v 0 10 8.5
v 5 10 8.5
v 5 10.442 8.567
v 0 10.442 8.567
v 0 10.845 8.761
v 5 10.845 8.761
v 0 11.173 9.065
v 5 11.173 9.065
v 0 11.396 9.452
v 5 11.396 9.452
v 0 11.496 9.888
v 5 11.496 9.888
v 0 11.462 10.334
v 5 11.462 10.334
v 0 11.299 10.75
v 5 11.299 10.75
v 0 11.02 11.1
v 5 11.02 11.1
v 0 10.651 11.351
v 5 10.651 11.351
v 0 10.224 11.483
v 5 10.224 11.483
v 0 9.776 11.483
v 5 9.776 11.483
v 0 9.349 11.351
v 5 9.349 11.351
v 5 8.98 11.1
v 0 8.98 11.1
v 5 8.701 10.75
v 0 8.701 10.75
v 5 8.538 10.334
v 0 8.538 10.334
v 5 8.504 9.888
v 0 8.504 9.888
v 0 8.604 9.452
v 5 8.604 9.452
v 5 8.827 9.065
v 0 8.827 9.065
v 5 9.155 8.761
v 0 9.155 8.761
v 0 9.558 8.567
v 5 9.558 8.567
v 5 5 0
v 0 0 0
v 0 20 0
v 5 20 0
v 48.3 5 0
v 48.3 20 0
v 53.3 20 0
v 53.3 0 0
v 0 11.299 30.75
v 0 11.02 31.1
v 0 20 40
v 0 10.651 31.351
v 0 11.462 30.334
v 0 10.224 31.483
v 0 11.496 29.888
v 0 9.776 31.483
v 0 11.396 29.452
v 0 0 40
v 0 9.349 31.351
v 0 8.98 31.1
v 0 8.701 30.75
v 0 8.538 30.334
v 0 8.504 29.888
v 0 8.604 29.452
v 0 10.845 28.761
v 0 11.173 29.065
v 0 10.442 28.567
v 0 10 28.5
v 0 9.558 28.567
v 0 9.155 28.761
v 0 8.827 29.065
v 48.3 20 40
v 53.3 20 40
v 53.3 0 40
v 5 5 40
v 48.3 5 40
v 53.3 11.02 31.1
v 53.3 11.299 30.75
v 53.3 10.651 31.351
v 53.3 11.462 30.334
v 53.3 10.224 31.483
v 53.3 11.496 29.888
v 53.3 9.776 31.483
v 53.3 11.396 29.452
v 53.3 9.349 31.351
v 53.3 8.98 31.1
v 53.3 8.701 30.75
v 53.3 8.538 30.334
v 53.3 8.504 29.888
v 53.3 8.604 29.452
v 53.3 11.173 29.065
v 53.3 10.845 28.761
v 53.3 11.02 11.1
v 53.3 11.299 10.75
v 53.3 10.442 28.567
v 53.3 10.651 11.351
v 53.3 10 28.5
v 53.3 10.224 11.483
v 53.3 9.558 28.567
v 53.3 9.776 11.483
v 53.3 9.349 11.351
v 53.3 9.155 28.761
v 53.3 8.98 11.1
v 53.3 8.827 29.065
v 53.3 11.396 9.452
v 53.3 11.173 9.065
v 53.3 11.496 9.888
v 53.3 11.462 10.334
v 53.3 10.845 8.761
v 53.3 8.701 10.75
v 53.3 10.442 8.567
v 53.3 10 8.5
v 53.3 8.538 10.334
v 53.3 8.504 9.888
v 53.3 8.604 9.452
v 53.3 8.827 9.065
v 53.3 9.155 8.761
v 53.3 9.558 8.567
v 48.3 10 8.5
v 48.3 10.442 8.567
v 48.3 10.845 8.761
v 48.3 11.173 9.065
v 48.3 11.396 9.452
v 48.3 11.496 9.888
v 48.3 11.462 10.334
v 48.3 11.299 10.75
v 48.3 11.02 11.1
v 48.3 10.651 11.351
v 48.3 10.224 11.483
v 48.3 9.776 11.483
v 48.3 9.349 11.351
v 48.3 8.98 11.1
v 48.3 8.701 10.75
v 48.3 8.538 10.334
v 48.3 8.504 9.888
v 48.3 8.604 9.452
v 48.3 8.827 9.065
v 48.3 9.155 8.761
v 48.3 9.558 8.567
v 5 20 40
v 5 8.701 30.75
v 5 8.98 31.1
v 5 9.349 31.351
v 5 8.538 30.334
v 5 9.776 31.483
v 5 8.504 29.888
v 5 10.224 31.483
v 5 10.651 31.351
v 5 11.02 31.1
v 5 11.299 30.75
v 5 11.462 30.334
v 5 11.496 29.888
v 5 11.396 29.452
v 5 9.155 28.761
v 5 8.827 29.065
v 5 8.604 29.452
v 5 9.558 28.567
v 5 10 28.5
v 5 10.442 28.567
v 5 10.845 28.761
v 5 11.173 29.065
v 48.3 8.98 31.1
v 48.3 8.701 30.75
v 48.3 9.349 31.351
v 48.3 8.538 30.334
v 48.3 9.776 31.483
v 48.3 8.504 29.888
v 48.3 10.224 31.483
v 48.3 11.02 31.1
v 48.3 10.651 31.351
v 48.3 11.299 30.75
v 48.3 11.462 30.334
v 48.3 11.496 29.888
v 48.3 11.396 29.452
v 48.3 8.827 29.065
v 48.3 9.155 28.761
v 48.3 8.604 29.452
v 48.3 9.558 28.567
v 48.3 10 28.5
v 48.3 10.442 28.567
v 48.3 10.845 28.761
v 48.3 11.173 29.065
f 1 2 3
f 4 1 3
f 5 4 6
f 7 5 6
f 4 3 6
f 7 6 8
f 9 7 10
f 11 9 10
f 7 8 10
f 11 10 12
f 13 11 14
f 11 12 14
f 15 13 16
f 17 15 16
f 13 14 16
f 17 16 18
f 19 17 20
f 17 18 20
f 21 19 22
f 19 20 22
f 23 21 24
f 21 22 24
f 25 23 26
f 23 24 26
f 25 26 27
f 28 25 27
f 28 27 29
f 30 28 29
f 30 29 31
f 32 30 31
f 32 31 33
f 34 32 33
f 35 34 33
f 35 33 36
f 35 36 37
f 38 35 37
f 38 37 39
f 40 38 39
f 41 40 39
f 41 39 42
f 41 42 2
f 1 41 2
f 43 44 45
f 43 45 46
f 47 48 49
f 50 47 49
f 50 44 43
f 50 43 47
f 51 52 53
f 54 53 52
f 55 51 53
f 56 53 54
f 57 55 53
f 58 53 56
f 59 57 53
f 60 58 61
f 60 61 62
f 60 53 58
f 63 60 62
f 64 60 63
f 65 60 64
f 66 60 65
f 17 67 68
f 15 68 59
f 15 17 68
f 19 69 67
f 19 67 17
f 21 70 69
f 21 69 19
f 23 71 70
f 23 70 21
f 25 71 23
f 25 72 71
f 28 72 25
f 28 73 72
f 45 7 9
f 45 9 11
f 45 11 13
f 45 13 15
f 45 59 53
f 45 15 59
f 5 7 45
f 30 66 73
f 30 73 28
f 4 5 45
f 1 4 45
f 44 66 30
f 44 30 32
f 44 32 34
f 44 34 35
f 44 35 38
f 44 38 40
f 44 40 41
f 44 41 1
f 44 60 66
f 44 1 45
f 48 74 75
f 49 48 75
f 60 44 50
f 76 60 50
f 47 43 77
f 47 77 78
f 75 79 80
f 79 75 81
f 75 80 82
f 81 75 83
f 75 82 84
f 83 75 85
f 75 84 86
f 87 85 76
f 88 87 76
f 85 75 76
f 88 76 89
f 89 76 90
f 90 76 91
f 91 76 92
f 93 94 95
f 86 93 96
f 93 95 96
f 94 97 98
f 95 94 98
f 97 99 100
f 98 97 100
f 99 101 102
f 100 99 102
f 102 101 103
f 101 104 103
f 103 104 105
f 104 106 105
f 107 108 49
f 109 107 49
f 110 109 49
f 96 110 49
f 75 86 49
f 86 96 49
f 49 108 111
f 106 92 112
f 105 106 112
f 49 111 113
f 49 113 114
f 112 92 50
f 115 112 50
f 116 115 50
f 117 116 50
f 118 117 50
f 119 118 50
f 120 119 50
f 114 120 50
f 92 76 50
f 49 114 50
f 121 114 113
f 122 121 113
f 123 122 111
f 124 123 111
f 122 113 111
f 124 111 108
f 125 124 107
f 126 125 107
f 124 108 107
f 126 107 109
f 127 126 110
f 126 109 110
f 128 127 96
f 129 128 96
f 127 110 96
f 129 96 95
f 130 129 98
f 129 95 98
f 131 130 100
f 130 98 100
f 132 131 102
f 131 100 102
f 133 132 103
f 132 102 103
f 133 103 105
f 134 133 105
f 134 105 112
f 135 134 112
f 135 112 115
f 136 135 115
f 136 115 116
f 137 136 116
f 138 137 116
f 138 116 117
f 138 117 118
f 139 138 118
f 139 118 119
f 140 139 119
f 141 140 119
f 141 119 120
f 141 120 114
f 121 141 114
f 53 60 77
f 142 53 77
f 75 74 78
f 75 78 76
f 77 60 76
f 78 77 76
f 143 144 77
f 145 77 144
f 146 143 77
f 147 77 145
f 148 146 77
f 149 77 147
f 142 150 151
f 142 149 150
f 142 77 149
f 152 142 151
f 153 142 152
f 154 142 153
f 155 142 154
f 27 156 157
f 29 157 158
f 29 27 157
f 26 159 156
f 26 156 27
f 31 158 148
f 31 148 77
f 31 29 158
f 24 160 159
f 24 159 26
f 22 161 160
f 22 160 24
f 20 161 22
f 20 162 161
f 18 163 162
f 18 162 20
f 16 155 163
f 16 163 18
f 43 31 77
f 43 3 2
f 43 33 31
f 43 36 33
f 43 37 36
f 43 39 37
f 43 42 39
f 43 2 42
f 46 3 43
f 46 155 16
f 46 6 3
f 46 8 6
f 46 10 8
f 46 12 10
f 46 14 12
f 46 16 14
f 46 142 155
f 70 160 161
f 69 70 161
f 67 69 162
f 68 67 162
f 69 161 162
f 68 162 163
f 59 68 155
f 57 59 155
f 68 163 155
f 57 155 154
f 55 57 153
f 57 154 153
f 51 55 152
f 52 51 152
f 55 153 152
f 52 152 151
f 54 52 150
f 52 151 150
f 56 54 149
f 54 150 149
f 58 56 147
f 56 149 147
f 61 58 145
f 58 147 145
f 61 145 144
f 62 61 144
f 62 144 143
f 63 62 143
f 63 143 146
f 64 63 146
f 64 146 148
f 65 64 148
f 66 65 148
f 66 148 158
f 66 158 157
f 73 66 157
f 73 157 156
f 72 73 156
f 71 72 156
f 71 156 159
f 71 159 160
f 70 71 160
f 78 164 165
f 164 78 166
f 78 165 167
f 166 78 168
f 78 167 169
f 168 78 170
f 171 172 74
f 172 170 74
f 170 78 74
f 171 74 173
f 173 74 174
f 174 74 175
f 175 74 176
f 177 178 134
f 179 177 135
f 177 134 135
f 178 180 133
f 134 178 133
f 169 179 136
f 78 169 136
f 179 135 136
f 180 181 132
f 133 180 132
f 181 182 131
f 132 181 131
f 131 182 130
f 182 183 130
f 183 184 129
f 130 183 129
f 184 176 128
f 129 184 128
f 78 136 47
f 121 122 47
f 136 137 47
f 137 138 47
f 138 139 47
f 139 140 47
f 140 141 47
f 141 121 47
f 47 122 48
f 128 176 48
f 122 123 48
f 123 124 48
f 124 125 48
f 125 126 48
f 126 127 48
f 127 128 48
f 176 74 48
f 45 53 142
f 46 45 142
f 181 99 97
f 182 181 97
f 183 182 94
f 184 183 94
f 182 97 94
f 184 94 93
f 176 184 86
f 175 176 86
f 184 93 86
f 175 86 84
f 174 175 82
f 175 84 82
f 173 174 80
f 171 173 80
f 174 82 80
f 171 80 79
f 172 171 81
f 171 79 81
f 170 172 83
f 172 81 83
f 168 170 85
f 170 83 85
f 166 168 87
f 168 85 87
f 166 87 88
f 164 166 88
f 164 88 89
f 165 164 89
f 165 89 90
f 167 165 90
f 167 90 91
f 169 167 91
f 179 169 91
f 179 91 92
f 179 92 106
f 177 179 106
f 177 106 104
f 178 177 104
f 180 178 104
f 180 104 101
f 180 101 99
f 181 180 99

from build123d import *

# Parameters (mm, degrees)
ESQUISSE1_W             = 53.3
ESQUISSE1_H             = 40
BOSS_EXTRU_1_DEPTH      = 20
ESQUISSE2_W             = 43.3
ESQUISSE2_H             = 40
ENL_V_MAT_EXTRU_1_DEPTH = 15
ESQUISSE3_R             = 1.5
ENL_V_MAT_EXTRU_2_DEPTH = 54.3


with BuildPart() as part:
    # Esquisse1 → Boss.-Extru.1 (new body)
    with BuildSketch(Plane(origin=(0, 0, 0), x_dir=(1, 0, 0), z_dir=(0, 1, 0))):
        with Locations((26.65, -20)):
            Rectangle(ESQUISSE1_W, ESQUISSE1_H)
    extrude(amount=BOSS_EXTRU_1_DEPTH)

    # Esquisse2 → Enlèv. mat.-Extru.1 (cut)
    with BuildSketch(Plane(origin=(0, 20, 0), x_dir=(1, 0, 0), z_dir=(0, 1, 0))):
        with Locations((26.65, -20)):
            Rectangle(ESQUISSE2_W, ESQUISSE2_H)
    extrude(amount=-ENL_V_MAT_EXTRU_1_DEPTH, mode=Mode.SUBTRACT)

    # Esquisse3 → Enlèv. mat.-Extru.2 (cut, through all)
    with BuildSketch(Plane(origin=(53.3, 0, 0), x_dir=(0, 0, -1), z_dir=(1, 0, 0))):
        with Locations((-30, 10)):
            Circle(ESQUISSE3_R)
        with Locations((-10, 10)):
            Circle(ESQUISSE3_R)
    extrude(amount=-ENL_V_MAT_EXTRU_2_DEPTH, mode=Mode.SUBTRACT)


solid = part.part
